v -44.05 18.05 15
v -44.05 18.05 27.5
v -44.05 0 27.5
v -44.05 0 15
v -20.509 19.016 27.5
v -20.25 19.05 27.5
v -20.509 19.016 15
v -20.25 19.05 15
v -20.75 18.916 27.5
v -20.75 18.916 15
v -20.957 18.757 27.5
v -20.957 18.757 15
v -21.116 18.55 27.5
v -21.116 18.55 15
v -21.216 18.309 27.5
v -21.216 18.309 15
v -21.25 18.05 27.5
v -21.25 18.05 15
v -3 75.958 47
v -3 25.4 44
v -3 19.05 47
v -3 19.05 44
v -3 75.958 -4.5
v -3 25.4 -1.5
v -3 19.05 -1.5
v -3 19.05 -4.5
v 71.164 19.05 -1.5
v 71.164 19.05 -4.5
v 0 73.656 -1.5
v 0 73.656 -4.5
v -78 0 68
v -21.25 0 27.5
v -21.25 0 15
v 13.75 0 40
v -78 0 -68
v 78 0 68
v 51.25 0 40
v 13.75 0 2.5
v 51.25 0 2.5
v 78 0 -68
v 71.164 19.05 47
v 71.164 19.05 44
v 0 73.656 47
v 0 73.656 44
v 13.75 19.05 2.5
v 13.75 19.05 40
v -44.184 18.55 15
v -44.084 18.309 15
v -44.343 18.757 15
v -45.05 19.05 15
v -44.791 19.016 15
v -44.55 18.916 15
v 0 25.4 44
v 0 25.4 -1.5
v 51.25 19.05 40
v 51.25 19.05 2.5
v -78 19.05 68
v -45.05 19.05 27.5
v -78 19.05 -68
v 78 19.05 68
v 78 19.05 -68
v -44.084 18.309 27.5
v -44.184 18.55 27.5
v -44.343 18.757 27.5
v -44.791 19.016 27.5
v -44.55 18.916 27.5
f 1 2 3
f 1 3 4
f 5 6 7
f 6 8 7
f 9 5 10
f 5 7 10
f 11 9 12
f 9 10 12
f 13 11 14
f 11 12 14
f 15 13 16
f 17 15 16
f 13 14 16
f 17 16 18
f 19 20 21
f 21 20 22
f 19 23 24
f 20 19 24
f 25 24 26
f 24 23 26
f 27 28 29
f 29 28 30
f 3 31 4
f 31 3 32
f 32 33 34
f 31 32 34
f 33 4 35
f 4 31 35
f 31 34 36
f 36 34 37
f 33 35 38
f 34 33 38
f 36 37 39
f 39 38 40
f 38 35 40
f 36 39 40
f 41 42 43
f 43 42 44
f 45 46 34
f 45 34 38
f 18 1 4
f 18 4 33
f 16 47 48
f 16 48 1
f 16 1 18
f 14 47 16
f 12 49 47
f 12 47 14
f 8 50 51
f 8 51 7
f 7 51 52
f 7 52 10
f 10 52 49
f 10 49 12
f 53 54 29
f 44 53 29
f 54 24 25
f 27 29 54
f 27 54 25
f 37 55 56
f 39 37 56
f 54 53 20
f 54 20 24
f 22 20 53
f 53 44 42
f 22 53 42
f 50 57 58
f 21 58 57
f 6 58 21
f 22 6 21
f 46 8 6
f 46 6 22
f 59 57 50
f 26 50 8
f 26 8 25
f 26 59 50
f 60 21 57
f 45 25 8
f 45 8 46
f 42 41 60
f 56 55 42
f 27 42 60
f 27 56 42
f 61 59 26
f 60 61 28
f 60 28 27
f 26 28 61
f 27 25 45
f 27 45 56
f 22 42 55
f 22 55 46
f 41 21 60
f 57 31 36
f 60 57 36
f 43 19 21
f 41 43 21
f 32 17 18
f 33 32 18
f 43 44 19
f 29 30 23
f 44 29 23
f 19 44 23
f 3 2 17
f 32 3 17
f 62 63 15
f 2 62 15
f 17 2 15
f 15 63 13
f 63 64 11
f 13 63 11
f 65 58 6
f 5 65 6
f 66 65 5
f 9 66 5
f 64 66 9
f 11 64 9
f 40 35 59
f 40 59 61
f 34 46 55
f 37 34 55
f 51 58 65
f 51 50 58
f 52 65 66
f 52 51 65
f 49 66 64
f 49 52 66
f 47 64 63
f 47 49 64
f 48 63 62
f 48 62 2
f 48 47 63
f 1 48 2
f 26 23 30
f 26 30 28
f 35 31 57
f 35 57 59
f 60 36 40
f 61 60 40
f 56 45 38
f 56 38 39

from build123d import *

# Parameters (mm, degrees)
SKETCH1_W             = 156
SKETCH1_H             = 136
BOSS_EXTRUDE1_DEPTH   = 19.05
SKETCH2_W             = 37.5
SKETCH2_H             = 37.5
CUT_EXTRUDE1_DEPTH    = 106.218356288
SKETCH3_W             = 22.8
SKETCH3_H             = 12.5
CUT_EXTRUDE2_DEPTH    = 106.218356288
FILLET1_R             = 1
BOSS_EXTRUDE2_START   = -4.5
BOSS_EXTRUDE2_DEPTH   = 51.5
BOSS_EXTRUDE2_2_DEPTH = 3
BOSS_EXTRUDE2_START_2 = 44
BOSS_EXTRUDE2_3_DEPTH = 3
CUT_EXTRUDE3_REACH    = 130.365
SKETCH5_W             = 45.5
SKETCH5_H             = 6.35


# Read off the part's stored shape, not the designer's step: Boss-Extrude2
with BuildPart() as part:
    # Sketch1 → Boss-Extrude1 (new body)
    with BuildSketch(Plane(origin=(0, 0, 0), x_dir=(1, 0, 0), z_dir=(0, 1, 0))):
        Rectangle(SKETCH1_W, SKETCH1_H)
    extrude(amount=BOSS_EXTRUDE1_DEPTH)

    # Sketch2 → Cut-Extrude1 (cut, through all)
    with BuildSketch(Plane(origin=(0, 19.05, 0), x_dir=(1, 0, 0), z_dir=(0, 1, 0))):
        with Locations((32.5, -21.25)):
            Rectangle(SKETCH2_W, SKETCH2_H)
    extrude(amount=-CUT_EXTRUDE1_DEPTH, mode=Mode.SUBTRACT)

    # Sketch3 → Cut-Extrude2 (cut, through all)
    with BuildSketch(Plane(origin=(0, 19.05, 0), x_dir=(1, 0, 0), z_dir=(0, 1, 0))):
        with Locations((-32.65, -21.25)):
            Rectangle(SKETCH3_W, SKETCH3_H)
    extrude(amount=-CUT_EXTRUDE2_DEPTH, mode=Mode.SUBTRACT)

    # Fillet1
    fillet1_edges = [part.edges().sort_by_distance(p)[0] for p in [
        (-44.05, 19.05, 21.25),
        (-21.25, 19.05, 21.25),
    ]]
    fillet(fillet1_edges, radius=FILLET1_R)

    # Boss-Extrude2 outline → Boss-Extrude2 (add)
    with BuildSketch(Plane.XY.offset(BOSS_EXTRUDE2_START)):
        Polygon((-3, 19.05), (0, 19.05), (0, 73.655885813), (-3, 75.957866777), align=None)
    extrude(amount=BOSS_EXTRUDE2_DEPTH)

    # Boss-Extrude2 2 outline → Boss-Extrude2 2 (add)
    with BuildSketch(Plane.XY.offset(BOSS_EXTRUDE2_START)):
        Polygon((0, 73.655885813), (0, 19.05), (71.163775898, 19.05), align=None)
    extrude(amount=BOSS_EXTRUDE2_2_DEPTH)

    # Boss-Extrude2 3 outline → Boss-Extrude2 3 (add)
    with BuildSketch(Plane.XY.offset(BOSS_EXTRUDE2_START_2)):
        Polygon((0, 73.655885813), (0, 19.05), (71.163775898, 19.05), align=None)
    extrude(amount=BOSS_EXTRUDE2_3_DEPTH)

    # Sketch5 → Cut-Extrude3 (cut, up to next)
    with BuildSketch(Plane(origin=(0, 0, 0), x_dir=(0, 0, -1), z_dir=(1, 0, 0)), mode=Mode.PRIVATE) as cut_extrude3_sk1:
        with Locations((-21.25, 22.225)):
            Rectangle(SKETCH5_W, SKETCH5_H)
    cut_extrude3_tool1 = extrude(cut_extrude3_sk1.sketch, amount=-CUT_EXTRUDE3_REACH, mode=Mode.PRIVATE) & part.part
    add(cut_extrude3_tool1.solids().sort_by_distance((0, 22.225, 21.25))[0], mode=Mode.SUBTRACT)


solid = part.part
